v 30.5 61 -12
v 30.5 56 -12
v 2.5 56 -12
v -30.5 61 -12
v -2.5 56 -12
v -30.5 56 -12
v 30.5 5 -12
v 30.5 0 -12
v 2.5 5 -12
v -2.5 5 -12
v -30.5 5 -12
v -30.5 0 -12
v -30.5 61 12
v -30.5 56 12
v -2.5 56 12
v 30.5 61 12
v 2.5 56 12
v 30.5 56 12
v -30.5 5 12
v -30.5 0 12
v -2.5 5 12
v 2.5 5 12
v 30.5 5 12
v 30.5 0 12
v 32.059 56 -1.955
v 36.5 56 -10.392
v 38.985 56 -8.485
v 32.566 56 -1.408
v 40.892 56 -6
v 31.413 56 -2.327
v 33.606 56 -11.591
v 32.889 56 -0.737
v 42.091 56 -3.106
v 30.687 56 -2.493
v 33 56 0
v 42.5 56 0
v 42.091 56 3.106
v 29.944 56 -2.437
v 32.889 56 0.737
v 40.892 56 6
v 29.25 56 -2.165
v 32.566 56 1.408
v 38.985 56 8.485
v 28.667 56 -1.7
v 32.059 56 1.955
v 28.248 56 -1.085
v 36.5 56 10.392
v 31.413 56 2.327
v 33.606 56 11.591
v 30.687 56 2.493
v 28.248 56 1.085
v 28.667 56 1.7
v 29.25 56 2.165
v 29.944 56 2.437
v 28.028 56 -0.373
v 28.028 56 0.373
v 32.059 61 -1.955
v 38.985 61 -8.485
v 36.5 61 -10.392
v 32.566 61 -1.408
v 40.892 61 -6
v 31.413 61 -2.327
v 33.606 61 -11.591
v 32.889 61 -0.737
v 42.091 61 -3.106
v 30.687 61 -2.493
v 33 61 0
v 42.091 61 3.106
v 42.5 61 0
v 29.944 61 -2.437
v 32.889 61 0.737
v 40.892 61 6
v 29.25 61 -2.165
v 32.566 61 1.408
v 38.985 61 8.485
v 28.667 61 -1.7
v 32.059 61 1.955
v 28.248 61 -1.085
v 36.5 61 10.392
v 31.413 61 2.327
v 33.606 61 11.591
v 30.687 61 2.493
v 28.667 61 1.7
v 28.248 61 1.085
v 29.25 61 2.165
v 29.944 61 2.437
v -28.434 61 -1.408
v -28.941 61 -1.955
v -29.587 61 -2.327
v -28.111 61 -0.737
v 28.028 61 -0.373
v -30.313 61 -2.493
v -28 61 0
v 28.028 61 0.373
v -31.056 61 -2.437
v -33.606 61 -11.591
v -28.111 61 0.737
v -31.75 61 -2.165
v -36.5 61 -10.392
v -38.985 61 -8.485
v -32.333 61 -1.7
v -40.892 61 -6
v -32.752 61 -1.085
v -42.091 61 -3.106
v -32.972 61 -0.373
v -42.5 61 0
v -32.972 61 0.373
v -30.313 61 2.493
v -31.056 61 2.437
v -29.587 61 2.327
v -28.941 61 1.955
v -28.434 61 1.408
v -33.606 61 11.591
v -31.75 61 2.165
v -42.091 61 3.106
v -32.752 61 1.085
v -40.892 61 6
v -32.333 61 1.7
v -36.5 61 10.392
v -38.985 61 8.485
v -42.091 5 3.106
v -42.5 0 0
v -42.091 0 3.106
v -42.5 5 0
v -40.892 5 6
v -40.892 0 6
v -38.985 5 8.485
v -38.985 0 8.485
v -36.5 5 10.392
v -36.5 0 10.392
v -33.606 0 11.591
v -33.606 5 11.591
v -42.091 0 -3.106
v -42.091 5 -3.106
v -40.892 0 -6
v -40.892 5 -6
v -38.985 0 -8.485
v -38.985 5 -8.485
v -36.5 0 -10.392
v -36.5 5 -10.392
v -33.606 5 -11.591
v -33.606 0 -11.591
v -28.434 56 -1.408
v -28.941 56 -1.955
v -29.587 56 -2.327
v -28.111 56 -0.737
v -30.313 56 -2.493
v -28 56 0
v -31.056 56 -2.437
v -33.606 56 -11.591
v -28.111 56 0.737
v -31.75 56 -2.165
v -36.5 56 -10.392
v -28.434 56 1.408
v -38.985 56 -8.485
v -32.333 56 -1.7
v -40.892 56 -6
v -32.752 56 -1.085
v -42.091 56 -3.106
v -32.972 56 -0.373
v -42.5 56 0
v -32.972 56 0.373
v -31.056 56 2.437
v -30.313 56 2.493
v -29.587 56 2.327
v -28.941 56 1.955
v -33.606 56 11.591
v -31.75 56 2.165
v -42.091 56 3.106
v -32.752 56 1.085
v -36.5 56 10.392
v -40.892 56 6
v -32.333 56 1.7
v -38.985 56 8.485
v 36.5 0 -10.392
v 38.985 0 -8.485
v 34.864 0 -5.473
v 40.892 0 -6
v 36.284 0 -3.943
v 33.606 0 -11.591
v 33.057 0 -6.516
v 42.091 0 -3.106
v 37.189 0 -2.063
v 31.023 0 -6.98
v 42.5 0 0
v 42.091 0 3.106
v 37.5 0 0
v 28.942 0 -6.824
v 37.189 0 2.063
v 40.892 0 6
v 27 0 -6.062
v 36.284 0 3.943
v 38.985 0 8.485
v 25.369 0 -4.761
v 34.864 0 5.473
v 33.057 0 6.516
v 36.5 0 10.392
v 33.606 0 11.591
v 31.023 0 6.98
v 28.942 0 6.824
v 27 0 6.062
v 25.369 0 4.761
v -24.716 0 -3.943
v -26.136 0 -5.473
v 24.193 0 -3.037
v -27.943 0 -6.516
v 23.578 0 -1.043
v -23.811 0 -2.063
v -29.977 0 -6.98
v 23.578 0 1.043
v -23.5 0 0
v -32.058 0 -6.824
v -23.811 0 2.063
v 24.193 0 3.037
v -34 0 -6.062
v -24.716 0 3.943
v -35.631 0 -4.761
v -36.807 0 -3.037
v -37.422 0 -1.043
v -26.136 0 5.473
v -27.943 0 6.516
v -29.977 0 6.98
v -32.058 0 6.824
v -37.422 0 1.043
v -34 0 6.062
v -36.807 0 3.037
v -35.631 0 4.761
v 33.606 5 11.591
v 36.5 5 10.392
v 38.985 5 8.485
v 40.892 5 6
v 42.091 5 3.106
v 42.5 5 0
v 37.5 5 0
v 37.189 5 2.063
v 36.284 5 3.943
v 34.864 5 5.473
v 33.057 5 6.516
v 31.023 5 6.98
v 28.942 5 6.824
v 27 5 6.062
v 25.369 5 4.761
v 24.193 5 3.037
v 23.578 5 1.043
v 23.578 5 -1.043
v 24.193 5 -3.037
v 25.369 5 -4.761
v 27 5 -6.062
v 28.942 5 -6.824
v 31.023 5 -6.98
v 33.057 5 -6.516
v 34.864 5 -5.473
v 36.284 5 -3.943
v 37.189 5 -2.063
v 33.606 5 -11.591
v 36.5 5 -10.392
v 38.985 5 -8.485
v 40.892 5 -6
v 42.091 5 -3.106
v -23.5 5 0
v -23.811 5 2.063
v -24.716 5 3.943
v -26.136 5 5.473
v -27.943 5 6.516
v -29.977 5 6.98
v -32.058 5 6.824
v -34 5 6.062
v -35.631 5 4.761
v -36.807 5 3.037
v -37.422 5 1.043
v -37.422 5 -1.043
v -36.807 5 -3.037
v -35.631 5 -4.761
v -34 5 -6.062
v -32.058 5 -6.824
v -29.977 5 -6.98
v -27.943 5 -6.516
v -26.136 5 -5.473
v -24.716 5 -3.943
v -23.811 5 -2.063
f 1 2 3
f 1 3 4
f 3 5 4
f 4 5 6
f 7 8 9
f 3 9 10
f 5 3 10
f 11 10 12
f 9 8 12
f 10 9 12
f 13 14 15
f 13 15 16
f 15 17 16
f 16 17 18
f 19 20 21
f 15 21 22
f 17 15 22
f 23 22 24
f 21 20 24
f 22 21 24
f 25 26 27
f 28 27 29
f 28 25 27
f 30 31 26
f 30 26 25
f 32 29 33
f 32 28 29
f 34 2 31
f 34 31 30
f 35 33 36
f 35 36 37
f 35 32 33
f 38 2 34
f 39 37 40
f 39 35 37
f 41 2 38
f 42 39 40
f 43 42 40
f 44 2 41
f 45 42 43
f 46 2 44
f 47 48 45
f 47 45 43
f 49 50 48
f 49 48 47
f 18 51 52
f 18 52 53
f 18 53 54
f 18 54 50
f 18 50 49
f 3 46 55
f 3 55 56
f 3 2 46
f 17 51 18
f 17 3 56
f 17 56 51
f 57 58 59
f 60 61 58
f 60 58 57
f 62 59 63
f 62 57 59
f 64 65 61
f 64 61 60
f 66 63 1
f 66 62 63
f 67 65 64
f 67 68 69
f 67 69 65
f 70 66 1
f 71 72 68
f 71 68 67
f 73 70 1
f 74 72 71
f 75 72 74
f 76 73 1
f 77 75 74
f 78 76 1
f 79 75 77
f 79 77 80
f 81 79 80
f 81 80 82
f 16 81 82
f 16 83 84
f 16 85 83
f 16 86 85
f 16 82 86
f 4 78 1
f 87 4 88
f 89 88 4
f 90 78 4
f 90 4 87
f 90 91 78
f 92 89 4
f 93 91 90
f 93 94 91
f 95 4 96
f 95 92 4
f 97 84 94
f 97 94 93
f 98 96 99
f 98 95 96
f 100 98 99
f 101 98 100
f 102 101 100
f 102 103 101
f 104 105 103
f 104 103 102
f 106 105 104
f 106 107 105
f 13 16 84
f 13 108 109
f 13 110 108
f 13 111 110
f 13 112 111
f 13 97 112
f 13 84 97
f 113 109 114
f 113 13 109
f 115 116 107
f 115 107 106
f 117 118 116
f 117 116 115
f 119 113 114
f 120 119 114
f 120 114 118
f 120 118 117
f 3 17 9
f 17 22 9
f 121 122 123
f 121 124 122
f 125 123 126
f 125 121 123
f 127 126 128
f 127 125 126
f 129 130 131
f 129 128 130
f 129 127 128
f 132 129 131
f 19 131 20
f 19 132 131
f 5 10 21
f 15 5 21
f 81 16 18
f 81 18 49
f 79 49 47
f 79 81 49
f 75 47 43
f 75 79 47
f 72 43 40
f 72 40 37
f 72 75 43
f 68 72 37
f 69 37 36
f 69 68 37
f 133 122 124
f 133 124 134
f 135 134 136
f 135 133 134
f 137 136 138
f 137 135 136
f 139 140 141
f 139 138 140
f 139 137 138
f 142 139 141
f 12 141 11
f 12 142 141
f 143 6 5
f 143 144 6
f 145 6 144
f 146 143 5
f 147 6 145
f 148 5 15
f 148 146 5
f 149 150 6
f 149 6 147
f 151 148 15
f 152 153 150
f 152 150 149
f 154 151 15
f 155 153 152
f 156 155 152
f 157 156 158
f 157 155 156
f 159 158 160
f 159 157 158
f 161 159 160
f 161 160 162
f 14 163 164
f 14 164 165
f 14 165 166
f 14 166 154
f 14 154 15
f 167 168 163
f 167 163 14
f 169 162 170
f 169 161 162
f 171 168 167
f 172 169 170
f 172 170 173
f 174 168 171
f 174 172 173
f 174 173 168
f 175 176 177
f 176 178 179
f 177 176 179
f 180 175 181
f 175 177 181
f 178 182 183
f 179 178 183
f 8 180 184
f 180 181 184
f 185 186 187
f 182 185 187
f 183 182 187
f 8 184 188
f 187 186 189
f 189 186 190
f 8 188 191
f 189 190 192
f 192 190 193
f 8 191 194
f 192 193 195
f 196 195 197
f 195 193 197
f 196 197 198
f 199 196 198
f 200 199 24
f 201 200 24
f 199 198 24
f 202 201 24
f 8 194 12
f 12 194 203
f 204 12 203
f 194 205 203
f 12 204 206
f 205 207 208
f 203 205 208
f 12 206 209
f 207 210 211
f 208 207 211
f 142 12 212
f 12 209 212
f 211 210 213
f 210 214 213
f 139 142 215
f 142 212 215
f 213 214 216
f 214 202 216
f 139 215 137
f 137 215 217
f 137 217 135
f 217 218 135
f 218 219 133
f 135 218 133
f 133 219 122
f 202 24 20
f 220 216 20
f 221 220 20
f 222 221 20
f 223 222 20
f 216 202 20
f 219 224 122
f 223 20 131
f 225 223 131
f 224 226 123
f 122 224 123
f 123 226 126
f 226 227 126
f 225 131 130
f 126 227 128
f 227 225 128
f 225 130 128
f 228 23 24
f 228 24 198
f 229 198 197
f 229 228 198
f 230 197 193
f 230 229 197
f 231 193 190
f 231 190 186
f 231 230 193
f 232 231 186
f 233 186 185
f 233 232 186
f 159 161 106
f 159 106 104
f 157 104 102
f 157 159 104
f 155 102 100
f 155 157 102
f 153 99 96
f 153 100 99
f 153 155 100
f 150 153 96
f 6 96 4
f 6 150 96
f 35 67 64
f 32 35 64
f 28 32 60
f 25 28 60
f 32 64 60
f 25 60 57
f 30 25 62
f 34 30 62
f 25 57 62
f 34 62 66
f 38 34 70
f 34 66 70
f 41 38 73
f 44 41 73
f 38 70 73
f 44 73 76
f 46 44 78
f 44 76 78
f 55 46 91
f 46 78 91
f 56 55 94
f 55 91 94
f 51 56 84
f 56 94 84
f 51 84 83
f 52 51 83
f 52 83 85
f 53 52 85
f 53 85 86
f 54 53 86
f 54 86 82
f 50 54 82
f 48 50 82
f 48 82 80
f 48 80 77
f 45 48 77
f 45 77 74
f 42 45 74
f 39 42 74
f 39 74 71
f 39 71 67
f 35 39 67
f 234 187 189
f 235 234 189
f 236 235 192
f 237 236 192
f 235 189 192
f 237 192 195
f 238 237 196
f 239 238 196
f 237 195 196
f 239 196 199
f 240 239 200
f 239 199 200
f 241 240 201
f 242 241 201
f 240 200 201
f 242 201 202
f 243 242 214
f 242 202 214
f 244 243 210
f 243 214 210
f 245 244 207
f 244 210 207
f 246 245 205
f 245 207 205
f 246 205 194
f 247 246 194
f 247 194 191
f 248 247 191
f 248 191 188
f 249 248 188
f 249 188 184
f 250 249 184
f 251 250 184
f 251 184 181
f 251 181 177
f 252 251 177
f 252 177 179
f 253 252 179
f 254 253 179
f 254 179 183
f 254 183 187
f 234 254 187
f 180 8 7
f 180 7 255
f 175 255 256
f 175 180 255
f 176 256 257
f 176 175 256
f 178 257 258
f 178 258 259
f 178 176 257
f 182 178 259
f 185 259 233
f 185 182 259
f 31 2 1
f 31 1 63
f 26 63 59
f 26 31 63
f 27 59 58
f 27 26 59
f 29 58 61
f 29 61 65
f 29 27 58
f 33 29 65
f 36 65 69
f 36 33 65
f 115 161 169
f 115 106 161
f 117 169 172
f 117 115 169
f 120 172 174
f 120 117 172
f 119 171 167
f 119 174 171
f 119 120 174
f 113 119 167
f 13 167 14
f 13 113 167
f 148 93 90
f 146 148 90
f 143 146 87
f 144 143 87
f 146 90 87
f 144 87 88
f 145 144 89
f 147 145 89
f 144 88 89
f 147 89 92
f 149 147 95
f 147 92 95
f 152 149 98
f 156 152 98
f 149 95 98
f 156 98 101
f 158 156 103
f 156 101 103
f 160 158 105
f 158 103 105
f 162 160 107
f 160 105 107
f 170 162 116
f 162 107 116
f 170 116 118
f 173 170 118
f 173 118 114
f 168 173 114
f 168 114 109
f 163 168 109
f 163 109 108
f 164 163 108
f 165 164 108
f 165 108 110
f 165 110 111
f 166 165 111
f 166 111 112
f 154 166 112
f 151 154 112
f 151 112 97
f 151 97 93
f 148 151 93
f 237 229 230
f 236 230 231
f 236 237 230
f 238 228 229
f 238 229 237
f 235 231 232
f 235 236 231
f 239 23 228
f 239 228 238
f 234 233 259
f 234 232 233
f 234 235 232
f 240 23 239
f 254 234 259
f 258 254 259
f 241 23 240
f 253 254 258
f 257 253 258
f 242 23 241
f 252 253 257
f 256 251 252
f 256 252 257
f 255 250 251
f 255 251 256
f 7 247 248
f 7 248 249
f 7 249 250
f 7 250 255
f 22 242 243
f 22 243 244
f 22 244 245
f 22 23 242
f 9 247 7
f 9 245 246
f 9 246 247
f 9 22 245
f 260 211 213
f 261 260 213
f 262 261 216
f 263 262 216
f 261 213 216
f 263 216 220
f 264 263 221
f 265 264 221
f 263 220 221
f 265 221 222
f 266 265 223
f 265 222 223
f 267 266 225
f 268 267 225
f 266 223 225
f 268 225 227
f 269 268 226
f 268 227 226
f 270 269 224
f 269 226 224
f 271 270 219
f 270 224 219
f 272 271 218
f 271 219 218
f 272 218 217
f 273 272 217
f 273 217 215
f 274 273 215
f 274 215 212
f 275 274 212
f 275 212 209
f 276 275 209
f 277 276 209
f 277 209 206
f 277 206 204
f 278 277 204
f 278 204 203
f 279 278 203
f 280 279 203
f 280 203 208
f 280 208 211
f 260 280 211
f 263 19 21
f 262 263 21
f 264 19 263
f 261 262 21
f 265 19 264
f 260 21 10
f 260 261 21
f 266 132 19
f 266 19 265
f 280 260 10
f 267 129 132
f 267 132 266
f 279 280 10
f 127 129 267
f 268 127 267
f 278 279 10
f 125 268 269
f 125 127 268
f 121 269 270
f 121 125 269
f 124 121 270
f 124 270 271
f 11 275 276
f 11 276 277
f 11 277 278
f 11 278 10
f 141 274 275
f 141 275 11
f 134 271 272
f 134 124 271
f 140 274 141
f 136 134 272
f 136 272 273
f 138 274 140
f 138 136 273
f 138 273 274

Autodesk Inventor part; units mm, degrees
ref_plane "YZ Plane" through (0, 0, 0) normal (1, 0, 0) x (0, 1, 0)
ref_plane "XZ Plane" through (0, 0, 0) normal (0, 1, 0) x (-1, 0, 0)
ref_plane "XY Plane" through (0, 0, 0) normal (0, 0, 1) x (1, 0, 0)
sketch "Sketch3" plane through (0, 0, 0) normal (0, 1, 0) x (-1, 0, 0)
  line L0 (2.5, 12) -> (-2.5, 12)
  line L1 (-2.5, 12) -> (-2.5, -12)
  line L2 (-2.5, -12) -> (2.5, -12)
  line L3 (2.5, -12) -> (2.5, 12)
  point P0 (0, 0)
  point P1 (0, 12)
  point P2 (2.5, 0)
  dimension "d6" = 5
  dimension "d7" = 24
extrude "Extrusion3" add sketch "Sketch3" along normal blind 61
sketch "Sketch4" plane through (2.5, 0, 12) normal (1, 0, 0) x (0, 0, -1)
  line L0 (0, 61) -> (24, 61)
  line L1 (24, 61) -> (24, 56)
  line L2 (24, 56) -> (0, 56)
  line L3 (0, 56) -> (0, 61)
  line L4 (0, 5) -> (24, 5)
  line L5 (24, 5) -> (24, 0)
  line L6 (24, 0) -> (0, 0)
  line L7 (0, 0) -> (0, 5)
  line L8 (0, 61) -> (24, 61) projected
  line L9 (0, 0) -> (24, 0) projected
  line L10 (0, 0) -> (0, 61) projected
  point P0 (12, 0)
  point P1 (12, 61)
  point P2 (12, 0)
  point P3 (12, 56)
  point P4 (12, 61)
  point P5 (12, 5)
  point P6 (12, 0)
  point P7 (0, 58.5)
  dimension "d10" = 5
extrude "Extrusion4" add sketch "Sketch4" along normal blind 40 and the other way blind 45
fillet "Fillet4" radius 12 8 edges at (42.5, 2.5, -12) (42.5, 2.5, 12) (42.5, 58.5, 12) (42.5, 58.5, -12) (-42.5, 58.5, 12) (-42.5, 2.5, 12) (-42.5, 58.5, -12) (-42.5, 2.5, -12)
sketch "Sketch8" plane through (0, 61, 0) normal (0, 1, 0) x (1, 0, 0)
  circle A0 centre (-30.5, 0) radius 2.5
  circle A1 centre (30.5, 0) radius 2.5
  arc A2 (-30.5, 12) -> (-30.5, -12) centre (-30.5, 0) ccw projected
  arc A3 (30.5, -12) -> (30.5, 12) centre (30.5, 0) ccw projected
  point P0 (0, 0)
  dimension "d27" = 5
extrude "Extrusion7" cut sketch "Sketch8" against normal up to surface (5 mm away)
sketch "Sketch9" plane through (0, 0, 0) normal (0, -1, 0) x (1, 0, 0)
  circle A0 centre (-30.5, 0) radius 7
  circle A1 centre (30.5, 0) radius 7
  arc A2 (-30.5, 12) -> (-30.5, -12) centre (-30.5, 0) ccw projected
  arc A3 (30.5, -12) -> (30.5, 12) centre (30.5, 0) ccw projected
  point P0 (0, 0)
  dimension "d30" = 14
extrude "Extrusion8" cut sketch "Sketch9" against normal up to next
equation "\"d6\" = b_mat_thickness"
equation "\"d7\" = sa_diameter"
equation "\"d8\" = sa_thickness + s_height + s_shaft_height + 3 * b_mat_thickness"
equation "\"d10\" = b_mat_thickness"
equation "\"d24\" = d11 + b_mat_thickness"
equation "\"d26\" = 0.5 * sa_diameter"
equation "\"d30\" = bb_outer_diameter"
equation "\"b_mat_thickness\" = 5"
equation "\"sa_diameter\" = 24"
equation "\"sa_thickness\" = 2"
equation "\"s_height\" = 38"
equation "\"s_shaft_height\" = 6"
equation "\"d11\" = 40"
equation "\"bb_outer_diameter\" = 14"
properties part number "Middle_leg"
